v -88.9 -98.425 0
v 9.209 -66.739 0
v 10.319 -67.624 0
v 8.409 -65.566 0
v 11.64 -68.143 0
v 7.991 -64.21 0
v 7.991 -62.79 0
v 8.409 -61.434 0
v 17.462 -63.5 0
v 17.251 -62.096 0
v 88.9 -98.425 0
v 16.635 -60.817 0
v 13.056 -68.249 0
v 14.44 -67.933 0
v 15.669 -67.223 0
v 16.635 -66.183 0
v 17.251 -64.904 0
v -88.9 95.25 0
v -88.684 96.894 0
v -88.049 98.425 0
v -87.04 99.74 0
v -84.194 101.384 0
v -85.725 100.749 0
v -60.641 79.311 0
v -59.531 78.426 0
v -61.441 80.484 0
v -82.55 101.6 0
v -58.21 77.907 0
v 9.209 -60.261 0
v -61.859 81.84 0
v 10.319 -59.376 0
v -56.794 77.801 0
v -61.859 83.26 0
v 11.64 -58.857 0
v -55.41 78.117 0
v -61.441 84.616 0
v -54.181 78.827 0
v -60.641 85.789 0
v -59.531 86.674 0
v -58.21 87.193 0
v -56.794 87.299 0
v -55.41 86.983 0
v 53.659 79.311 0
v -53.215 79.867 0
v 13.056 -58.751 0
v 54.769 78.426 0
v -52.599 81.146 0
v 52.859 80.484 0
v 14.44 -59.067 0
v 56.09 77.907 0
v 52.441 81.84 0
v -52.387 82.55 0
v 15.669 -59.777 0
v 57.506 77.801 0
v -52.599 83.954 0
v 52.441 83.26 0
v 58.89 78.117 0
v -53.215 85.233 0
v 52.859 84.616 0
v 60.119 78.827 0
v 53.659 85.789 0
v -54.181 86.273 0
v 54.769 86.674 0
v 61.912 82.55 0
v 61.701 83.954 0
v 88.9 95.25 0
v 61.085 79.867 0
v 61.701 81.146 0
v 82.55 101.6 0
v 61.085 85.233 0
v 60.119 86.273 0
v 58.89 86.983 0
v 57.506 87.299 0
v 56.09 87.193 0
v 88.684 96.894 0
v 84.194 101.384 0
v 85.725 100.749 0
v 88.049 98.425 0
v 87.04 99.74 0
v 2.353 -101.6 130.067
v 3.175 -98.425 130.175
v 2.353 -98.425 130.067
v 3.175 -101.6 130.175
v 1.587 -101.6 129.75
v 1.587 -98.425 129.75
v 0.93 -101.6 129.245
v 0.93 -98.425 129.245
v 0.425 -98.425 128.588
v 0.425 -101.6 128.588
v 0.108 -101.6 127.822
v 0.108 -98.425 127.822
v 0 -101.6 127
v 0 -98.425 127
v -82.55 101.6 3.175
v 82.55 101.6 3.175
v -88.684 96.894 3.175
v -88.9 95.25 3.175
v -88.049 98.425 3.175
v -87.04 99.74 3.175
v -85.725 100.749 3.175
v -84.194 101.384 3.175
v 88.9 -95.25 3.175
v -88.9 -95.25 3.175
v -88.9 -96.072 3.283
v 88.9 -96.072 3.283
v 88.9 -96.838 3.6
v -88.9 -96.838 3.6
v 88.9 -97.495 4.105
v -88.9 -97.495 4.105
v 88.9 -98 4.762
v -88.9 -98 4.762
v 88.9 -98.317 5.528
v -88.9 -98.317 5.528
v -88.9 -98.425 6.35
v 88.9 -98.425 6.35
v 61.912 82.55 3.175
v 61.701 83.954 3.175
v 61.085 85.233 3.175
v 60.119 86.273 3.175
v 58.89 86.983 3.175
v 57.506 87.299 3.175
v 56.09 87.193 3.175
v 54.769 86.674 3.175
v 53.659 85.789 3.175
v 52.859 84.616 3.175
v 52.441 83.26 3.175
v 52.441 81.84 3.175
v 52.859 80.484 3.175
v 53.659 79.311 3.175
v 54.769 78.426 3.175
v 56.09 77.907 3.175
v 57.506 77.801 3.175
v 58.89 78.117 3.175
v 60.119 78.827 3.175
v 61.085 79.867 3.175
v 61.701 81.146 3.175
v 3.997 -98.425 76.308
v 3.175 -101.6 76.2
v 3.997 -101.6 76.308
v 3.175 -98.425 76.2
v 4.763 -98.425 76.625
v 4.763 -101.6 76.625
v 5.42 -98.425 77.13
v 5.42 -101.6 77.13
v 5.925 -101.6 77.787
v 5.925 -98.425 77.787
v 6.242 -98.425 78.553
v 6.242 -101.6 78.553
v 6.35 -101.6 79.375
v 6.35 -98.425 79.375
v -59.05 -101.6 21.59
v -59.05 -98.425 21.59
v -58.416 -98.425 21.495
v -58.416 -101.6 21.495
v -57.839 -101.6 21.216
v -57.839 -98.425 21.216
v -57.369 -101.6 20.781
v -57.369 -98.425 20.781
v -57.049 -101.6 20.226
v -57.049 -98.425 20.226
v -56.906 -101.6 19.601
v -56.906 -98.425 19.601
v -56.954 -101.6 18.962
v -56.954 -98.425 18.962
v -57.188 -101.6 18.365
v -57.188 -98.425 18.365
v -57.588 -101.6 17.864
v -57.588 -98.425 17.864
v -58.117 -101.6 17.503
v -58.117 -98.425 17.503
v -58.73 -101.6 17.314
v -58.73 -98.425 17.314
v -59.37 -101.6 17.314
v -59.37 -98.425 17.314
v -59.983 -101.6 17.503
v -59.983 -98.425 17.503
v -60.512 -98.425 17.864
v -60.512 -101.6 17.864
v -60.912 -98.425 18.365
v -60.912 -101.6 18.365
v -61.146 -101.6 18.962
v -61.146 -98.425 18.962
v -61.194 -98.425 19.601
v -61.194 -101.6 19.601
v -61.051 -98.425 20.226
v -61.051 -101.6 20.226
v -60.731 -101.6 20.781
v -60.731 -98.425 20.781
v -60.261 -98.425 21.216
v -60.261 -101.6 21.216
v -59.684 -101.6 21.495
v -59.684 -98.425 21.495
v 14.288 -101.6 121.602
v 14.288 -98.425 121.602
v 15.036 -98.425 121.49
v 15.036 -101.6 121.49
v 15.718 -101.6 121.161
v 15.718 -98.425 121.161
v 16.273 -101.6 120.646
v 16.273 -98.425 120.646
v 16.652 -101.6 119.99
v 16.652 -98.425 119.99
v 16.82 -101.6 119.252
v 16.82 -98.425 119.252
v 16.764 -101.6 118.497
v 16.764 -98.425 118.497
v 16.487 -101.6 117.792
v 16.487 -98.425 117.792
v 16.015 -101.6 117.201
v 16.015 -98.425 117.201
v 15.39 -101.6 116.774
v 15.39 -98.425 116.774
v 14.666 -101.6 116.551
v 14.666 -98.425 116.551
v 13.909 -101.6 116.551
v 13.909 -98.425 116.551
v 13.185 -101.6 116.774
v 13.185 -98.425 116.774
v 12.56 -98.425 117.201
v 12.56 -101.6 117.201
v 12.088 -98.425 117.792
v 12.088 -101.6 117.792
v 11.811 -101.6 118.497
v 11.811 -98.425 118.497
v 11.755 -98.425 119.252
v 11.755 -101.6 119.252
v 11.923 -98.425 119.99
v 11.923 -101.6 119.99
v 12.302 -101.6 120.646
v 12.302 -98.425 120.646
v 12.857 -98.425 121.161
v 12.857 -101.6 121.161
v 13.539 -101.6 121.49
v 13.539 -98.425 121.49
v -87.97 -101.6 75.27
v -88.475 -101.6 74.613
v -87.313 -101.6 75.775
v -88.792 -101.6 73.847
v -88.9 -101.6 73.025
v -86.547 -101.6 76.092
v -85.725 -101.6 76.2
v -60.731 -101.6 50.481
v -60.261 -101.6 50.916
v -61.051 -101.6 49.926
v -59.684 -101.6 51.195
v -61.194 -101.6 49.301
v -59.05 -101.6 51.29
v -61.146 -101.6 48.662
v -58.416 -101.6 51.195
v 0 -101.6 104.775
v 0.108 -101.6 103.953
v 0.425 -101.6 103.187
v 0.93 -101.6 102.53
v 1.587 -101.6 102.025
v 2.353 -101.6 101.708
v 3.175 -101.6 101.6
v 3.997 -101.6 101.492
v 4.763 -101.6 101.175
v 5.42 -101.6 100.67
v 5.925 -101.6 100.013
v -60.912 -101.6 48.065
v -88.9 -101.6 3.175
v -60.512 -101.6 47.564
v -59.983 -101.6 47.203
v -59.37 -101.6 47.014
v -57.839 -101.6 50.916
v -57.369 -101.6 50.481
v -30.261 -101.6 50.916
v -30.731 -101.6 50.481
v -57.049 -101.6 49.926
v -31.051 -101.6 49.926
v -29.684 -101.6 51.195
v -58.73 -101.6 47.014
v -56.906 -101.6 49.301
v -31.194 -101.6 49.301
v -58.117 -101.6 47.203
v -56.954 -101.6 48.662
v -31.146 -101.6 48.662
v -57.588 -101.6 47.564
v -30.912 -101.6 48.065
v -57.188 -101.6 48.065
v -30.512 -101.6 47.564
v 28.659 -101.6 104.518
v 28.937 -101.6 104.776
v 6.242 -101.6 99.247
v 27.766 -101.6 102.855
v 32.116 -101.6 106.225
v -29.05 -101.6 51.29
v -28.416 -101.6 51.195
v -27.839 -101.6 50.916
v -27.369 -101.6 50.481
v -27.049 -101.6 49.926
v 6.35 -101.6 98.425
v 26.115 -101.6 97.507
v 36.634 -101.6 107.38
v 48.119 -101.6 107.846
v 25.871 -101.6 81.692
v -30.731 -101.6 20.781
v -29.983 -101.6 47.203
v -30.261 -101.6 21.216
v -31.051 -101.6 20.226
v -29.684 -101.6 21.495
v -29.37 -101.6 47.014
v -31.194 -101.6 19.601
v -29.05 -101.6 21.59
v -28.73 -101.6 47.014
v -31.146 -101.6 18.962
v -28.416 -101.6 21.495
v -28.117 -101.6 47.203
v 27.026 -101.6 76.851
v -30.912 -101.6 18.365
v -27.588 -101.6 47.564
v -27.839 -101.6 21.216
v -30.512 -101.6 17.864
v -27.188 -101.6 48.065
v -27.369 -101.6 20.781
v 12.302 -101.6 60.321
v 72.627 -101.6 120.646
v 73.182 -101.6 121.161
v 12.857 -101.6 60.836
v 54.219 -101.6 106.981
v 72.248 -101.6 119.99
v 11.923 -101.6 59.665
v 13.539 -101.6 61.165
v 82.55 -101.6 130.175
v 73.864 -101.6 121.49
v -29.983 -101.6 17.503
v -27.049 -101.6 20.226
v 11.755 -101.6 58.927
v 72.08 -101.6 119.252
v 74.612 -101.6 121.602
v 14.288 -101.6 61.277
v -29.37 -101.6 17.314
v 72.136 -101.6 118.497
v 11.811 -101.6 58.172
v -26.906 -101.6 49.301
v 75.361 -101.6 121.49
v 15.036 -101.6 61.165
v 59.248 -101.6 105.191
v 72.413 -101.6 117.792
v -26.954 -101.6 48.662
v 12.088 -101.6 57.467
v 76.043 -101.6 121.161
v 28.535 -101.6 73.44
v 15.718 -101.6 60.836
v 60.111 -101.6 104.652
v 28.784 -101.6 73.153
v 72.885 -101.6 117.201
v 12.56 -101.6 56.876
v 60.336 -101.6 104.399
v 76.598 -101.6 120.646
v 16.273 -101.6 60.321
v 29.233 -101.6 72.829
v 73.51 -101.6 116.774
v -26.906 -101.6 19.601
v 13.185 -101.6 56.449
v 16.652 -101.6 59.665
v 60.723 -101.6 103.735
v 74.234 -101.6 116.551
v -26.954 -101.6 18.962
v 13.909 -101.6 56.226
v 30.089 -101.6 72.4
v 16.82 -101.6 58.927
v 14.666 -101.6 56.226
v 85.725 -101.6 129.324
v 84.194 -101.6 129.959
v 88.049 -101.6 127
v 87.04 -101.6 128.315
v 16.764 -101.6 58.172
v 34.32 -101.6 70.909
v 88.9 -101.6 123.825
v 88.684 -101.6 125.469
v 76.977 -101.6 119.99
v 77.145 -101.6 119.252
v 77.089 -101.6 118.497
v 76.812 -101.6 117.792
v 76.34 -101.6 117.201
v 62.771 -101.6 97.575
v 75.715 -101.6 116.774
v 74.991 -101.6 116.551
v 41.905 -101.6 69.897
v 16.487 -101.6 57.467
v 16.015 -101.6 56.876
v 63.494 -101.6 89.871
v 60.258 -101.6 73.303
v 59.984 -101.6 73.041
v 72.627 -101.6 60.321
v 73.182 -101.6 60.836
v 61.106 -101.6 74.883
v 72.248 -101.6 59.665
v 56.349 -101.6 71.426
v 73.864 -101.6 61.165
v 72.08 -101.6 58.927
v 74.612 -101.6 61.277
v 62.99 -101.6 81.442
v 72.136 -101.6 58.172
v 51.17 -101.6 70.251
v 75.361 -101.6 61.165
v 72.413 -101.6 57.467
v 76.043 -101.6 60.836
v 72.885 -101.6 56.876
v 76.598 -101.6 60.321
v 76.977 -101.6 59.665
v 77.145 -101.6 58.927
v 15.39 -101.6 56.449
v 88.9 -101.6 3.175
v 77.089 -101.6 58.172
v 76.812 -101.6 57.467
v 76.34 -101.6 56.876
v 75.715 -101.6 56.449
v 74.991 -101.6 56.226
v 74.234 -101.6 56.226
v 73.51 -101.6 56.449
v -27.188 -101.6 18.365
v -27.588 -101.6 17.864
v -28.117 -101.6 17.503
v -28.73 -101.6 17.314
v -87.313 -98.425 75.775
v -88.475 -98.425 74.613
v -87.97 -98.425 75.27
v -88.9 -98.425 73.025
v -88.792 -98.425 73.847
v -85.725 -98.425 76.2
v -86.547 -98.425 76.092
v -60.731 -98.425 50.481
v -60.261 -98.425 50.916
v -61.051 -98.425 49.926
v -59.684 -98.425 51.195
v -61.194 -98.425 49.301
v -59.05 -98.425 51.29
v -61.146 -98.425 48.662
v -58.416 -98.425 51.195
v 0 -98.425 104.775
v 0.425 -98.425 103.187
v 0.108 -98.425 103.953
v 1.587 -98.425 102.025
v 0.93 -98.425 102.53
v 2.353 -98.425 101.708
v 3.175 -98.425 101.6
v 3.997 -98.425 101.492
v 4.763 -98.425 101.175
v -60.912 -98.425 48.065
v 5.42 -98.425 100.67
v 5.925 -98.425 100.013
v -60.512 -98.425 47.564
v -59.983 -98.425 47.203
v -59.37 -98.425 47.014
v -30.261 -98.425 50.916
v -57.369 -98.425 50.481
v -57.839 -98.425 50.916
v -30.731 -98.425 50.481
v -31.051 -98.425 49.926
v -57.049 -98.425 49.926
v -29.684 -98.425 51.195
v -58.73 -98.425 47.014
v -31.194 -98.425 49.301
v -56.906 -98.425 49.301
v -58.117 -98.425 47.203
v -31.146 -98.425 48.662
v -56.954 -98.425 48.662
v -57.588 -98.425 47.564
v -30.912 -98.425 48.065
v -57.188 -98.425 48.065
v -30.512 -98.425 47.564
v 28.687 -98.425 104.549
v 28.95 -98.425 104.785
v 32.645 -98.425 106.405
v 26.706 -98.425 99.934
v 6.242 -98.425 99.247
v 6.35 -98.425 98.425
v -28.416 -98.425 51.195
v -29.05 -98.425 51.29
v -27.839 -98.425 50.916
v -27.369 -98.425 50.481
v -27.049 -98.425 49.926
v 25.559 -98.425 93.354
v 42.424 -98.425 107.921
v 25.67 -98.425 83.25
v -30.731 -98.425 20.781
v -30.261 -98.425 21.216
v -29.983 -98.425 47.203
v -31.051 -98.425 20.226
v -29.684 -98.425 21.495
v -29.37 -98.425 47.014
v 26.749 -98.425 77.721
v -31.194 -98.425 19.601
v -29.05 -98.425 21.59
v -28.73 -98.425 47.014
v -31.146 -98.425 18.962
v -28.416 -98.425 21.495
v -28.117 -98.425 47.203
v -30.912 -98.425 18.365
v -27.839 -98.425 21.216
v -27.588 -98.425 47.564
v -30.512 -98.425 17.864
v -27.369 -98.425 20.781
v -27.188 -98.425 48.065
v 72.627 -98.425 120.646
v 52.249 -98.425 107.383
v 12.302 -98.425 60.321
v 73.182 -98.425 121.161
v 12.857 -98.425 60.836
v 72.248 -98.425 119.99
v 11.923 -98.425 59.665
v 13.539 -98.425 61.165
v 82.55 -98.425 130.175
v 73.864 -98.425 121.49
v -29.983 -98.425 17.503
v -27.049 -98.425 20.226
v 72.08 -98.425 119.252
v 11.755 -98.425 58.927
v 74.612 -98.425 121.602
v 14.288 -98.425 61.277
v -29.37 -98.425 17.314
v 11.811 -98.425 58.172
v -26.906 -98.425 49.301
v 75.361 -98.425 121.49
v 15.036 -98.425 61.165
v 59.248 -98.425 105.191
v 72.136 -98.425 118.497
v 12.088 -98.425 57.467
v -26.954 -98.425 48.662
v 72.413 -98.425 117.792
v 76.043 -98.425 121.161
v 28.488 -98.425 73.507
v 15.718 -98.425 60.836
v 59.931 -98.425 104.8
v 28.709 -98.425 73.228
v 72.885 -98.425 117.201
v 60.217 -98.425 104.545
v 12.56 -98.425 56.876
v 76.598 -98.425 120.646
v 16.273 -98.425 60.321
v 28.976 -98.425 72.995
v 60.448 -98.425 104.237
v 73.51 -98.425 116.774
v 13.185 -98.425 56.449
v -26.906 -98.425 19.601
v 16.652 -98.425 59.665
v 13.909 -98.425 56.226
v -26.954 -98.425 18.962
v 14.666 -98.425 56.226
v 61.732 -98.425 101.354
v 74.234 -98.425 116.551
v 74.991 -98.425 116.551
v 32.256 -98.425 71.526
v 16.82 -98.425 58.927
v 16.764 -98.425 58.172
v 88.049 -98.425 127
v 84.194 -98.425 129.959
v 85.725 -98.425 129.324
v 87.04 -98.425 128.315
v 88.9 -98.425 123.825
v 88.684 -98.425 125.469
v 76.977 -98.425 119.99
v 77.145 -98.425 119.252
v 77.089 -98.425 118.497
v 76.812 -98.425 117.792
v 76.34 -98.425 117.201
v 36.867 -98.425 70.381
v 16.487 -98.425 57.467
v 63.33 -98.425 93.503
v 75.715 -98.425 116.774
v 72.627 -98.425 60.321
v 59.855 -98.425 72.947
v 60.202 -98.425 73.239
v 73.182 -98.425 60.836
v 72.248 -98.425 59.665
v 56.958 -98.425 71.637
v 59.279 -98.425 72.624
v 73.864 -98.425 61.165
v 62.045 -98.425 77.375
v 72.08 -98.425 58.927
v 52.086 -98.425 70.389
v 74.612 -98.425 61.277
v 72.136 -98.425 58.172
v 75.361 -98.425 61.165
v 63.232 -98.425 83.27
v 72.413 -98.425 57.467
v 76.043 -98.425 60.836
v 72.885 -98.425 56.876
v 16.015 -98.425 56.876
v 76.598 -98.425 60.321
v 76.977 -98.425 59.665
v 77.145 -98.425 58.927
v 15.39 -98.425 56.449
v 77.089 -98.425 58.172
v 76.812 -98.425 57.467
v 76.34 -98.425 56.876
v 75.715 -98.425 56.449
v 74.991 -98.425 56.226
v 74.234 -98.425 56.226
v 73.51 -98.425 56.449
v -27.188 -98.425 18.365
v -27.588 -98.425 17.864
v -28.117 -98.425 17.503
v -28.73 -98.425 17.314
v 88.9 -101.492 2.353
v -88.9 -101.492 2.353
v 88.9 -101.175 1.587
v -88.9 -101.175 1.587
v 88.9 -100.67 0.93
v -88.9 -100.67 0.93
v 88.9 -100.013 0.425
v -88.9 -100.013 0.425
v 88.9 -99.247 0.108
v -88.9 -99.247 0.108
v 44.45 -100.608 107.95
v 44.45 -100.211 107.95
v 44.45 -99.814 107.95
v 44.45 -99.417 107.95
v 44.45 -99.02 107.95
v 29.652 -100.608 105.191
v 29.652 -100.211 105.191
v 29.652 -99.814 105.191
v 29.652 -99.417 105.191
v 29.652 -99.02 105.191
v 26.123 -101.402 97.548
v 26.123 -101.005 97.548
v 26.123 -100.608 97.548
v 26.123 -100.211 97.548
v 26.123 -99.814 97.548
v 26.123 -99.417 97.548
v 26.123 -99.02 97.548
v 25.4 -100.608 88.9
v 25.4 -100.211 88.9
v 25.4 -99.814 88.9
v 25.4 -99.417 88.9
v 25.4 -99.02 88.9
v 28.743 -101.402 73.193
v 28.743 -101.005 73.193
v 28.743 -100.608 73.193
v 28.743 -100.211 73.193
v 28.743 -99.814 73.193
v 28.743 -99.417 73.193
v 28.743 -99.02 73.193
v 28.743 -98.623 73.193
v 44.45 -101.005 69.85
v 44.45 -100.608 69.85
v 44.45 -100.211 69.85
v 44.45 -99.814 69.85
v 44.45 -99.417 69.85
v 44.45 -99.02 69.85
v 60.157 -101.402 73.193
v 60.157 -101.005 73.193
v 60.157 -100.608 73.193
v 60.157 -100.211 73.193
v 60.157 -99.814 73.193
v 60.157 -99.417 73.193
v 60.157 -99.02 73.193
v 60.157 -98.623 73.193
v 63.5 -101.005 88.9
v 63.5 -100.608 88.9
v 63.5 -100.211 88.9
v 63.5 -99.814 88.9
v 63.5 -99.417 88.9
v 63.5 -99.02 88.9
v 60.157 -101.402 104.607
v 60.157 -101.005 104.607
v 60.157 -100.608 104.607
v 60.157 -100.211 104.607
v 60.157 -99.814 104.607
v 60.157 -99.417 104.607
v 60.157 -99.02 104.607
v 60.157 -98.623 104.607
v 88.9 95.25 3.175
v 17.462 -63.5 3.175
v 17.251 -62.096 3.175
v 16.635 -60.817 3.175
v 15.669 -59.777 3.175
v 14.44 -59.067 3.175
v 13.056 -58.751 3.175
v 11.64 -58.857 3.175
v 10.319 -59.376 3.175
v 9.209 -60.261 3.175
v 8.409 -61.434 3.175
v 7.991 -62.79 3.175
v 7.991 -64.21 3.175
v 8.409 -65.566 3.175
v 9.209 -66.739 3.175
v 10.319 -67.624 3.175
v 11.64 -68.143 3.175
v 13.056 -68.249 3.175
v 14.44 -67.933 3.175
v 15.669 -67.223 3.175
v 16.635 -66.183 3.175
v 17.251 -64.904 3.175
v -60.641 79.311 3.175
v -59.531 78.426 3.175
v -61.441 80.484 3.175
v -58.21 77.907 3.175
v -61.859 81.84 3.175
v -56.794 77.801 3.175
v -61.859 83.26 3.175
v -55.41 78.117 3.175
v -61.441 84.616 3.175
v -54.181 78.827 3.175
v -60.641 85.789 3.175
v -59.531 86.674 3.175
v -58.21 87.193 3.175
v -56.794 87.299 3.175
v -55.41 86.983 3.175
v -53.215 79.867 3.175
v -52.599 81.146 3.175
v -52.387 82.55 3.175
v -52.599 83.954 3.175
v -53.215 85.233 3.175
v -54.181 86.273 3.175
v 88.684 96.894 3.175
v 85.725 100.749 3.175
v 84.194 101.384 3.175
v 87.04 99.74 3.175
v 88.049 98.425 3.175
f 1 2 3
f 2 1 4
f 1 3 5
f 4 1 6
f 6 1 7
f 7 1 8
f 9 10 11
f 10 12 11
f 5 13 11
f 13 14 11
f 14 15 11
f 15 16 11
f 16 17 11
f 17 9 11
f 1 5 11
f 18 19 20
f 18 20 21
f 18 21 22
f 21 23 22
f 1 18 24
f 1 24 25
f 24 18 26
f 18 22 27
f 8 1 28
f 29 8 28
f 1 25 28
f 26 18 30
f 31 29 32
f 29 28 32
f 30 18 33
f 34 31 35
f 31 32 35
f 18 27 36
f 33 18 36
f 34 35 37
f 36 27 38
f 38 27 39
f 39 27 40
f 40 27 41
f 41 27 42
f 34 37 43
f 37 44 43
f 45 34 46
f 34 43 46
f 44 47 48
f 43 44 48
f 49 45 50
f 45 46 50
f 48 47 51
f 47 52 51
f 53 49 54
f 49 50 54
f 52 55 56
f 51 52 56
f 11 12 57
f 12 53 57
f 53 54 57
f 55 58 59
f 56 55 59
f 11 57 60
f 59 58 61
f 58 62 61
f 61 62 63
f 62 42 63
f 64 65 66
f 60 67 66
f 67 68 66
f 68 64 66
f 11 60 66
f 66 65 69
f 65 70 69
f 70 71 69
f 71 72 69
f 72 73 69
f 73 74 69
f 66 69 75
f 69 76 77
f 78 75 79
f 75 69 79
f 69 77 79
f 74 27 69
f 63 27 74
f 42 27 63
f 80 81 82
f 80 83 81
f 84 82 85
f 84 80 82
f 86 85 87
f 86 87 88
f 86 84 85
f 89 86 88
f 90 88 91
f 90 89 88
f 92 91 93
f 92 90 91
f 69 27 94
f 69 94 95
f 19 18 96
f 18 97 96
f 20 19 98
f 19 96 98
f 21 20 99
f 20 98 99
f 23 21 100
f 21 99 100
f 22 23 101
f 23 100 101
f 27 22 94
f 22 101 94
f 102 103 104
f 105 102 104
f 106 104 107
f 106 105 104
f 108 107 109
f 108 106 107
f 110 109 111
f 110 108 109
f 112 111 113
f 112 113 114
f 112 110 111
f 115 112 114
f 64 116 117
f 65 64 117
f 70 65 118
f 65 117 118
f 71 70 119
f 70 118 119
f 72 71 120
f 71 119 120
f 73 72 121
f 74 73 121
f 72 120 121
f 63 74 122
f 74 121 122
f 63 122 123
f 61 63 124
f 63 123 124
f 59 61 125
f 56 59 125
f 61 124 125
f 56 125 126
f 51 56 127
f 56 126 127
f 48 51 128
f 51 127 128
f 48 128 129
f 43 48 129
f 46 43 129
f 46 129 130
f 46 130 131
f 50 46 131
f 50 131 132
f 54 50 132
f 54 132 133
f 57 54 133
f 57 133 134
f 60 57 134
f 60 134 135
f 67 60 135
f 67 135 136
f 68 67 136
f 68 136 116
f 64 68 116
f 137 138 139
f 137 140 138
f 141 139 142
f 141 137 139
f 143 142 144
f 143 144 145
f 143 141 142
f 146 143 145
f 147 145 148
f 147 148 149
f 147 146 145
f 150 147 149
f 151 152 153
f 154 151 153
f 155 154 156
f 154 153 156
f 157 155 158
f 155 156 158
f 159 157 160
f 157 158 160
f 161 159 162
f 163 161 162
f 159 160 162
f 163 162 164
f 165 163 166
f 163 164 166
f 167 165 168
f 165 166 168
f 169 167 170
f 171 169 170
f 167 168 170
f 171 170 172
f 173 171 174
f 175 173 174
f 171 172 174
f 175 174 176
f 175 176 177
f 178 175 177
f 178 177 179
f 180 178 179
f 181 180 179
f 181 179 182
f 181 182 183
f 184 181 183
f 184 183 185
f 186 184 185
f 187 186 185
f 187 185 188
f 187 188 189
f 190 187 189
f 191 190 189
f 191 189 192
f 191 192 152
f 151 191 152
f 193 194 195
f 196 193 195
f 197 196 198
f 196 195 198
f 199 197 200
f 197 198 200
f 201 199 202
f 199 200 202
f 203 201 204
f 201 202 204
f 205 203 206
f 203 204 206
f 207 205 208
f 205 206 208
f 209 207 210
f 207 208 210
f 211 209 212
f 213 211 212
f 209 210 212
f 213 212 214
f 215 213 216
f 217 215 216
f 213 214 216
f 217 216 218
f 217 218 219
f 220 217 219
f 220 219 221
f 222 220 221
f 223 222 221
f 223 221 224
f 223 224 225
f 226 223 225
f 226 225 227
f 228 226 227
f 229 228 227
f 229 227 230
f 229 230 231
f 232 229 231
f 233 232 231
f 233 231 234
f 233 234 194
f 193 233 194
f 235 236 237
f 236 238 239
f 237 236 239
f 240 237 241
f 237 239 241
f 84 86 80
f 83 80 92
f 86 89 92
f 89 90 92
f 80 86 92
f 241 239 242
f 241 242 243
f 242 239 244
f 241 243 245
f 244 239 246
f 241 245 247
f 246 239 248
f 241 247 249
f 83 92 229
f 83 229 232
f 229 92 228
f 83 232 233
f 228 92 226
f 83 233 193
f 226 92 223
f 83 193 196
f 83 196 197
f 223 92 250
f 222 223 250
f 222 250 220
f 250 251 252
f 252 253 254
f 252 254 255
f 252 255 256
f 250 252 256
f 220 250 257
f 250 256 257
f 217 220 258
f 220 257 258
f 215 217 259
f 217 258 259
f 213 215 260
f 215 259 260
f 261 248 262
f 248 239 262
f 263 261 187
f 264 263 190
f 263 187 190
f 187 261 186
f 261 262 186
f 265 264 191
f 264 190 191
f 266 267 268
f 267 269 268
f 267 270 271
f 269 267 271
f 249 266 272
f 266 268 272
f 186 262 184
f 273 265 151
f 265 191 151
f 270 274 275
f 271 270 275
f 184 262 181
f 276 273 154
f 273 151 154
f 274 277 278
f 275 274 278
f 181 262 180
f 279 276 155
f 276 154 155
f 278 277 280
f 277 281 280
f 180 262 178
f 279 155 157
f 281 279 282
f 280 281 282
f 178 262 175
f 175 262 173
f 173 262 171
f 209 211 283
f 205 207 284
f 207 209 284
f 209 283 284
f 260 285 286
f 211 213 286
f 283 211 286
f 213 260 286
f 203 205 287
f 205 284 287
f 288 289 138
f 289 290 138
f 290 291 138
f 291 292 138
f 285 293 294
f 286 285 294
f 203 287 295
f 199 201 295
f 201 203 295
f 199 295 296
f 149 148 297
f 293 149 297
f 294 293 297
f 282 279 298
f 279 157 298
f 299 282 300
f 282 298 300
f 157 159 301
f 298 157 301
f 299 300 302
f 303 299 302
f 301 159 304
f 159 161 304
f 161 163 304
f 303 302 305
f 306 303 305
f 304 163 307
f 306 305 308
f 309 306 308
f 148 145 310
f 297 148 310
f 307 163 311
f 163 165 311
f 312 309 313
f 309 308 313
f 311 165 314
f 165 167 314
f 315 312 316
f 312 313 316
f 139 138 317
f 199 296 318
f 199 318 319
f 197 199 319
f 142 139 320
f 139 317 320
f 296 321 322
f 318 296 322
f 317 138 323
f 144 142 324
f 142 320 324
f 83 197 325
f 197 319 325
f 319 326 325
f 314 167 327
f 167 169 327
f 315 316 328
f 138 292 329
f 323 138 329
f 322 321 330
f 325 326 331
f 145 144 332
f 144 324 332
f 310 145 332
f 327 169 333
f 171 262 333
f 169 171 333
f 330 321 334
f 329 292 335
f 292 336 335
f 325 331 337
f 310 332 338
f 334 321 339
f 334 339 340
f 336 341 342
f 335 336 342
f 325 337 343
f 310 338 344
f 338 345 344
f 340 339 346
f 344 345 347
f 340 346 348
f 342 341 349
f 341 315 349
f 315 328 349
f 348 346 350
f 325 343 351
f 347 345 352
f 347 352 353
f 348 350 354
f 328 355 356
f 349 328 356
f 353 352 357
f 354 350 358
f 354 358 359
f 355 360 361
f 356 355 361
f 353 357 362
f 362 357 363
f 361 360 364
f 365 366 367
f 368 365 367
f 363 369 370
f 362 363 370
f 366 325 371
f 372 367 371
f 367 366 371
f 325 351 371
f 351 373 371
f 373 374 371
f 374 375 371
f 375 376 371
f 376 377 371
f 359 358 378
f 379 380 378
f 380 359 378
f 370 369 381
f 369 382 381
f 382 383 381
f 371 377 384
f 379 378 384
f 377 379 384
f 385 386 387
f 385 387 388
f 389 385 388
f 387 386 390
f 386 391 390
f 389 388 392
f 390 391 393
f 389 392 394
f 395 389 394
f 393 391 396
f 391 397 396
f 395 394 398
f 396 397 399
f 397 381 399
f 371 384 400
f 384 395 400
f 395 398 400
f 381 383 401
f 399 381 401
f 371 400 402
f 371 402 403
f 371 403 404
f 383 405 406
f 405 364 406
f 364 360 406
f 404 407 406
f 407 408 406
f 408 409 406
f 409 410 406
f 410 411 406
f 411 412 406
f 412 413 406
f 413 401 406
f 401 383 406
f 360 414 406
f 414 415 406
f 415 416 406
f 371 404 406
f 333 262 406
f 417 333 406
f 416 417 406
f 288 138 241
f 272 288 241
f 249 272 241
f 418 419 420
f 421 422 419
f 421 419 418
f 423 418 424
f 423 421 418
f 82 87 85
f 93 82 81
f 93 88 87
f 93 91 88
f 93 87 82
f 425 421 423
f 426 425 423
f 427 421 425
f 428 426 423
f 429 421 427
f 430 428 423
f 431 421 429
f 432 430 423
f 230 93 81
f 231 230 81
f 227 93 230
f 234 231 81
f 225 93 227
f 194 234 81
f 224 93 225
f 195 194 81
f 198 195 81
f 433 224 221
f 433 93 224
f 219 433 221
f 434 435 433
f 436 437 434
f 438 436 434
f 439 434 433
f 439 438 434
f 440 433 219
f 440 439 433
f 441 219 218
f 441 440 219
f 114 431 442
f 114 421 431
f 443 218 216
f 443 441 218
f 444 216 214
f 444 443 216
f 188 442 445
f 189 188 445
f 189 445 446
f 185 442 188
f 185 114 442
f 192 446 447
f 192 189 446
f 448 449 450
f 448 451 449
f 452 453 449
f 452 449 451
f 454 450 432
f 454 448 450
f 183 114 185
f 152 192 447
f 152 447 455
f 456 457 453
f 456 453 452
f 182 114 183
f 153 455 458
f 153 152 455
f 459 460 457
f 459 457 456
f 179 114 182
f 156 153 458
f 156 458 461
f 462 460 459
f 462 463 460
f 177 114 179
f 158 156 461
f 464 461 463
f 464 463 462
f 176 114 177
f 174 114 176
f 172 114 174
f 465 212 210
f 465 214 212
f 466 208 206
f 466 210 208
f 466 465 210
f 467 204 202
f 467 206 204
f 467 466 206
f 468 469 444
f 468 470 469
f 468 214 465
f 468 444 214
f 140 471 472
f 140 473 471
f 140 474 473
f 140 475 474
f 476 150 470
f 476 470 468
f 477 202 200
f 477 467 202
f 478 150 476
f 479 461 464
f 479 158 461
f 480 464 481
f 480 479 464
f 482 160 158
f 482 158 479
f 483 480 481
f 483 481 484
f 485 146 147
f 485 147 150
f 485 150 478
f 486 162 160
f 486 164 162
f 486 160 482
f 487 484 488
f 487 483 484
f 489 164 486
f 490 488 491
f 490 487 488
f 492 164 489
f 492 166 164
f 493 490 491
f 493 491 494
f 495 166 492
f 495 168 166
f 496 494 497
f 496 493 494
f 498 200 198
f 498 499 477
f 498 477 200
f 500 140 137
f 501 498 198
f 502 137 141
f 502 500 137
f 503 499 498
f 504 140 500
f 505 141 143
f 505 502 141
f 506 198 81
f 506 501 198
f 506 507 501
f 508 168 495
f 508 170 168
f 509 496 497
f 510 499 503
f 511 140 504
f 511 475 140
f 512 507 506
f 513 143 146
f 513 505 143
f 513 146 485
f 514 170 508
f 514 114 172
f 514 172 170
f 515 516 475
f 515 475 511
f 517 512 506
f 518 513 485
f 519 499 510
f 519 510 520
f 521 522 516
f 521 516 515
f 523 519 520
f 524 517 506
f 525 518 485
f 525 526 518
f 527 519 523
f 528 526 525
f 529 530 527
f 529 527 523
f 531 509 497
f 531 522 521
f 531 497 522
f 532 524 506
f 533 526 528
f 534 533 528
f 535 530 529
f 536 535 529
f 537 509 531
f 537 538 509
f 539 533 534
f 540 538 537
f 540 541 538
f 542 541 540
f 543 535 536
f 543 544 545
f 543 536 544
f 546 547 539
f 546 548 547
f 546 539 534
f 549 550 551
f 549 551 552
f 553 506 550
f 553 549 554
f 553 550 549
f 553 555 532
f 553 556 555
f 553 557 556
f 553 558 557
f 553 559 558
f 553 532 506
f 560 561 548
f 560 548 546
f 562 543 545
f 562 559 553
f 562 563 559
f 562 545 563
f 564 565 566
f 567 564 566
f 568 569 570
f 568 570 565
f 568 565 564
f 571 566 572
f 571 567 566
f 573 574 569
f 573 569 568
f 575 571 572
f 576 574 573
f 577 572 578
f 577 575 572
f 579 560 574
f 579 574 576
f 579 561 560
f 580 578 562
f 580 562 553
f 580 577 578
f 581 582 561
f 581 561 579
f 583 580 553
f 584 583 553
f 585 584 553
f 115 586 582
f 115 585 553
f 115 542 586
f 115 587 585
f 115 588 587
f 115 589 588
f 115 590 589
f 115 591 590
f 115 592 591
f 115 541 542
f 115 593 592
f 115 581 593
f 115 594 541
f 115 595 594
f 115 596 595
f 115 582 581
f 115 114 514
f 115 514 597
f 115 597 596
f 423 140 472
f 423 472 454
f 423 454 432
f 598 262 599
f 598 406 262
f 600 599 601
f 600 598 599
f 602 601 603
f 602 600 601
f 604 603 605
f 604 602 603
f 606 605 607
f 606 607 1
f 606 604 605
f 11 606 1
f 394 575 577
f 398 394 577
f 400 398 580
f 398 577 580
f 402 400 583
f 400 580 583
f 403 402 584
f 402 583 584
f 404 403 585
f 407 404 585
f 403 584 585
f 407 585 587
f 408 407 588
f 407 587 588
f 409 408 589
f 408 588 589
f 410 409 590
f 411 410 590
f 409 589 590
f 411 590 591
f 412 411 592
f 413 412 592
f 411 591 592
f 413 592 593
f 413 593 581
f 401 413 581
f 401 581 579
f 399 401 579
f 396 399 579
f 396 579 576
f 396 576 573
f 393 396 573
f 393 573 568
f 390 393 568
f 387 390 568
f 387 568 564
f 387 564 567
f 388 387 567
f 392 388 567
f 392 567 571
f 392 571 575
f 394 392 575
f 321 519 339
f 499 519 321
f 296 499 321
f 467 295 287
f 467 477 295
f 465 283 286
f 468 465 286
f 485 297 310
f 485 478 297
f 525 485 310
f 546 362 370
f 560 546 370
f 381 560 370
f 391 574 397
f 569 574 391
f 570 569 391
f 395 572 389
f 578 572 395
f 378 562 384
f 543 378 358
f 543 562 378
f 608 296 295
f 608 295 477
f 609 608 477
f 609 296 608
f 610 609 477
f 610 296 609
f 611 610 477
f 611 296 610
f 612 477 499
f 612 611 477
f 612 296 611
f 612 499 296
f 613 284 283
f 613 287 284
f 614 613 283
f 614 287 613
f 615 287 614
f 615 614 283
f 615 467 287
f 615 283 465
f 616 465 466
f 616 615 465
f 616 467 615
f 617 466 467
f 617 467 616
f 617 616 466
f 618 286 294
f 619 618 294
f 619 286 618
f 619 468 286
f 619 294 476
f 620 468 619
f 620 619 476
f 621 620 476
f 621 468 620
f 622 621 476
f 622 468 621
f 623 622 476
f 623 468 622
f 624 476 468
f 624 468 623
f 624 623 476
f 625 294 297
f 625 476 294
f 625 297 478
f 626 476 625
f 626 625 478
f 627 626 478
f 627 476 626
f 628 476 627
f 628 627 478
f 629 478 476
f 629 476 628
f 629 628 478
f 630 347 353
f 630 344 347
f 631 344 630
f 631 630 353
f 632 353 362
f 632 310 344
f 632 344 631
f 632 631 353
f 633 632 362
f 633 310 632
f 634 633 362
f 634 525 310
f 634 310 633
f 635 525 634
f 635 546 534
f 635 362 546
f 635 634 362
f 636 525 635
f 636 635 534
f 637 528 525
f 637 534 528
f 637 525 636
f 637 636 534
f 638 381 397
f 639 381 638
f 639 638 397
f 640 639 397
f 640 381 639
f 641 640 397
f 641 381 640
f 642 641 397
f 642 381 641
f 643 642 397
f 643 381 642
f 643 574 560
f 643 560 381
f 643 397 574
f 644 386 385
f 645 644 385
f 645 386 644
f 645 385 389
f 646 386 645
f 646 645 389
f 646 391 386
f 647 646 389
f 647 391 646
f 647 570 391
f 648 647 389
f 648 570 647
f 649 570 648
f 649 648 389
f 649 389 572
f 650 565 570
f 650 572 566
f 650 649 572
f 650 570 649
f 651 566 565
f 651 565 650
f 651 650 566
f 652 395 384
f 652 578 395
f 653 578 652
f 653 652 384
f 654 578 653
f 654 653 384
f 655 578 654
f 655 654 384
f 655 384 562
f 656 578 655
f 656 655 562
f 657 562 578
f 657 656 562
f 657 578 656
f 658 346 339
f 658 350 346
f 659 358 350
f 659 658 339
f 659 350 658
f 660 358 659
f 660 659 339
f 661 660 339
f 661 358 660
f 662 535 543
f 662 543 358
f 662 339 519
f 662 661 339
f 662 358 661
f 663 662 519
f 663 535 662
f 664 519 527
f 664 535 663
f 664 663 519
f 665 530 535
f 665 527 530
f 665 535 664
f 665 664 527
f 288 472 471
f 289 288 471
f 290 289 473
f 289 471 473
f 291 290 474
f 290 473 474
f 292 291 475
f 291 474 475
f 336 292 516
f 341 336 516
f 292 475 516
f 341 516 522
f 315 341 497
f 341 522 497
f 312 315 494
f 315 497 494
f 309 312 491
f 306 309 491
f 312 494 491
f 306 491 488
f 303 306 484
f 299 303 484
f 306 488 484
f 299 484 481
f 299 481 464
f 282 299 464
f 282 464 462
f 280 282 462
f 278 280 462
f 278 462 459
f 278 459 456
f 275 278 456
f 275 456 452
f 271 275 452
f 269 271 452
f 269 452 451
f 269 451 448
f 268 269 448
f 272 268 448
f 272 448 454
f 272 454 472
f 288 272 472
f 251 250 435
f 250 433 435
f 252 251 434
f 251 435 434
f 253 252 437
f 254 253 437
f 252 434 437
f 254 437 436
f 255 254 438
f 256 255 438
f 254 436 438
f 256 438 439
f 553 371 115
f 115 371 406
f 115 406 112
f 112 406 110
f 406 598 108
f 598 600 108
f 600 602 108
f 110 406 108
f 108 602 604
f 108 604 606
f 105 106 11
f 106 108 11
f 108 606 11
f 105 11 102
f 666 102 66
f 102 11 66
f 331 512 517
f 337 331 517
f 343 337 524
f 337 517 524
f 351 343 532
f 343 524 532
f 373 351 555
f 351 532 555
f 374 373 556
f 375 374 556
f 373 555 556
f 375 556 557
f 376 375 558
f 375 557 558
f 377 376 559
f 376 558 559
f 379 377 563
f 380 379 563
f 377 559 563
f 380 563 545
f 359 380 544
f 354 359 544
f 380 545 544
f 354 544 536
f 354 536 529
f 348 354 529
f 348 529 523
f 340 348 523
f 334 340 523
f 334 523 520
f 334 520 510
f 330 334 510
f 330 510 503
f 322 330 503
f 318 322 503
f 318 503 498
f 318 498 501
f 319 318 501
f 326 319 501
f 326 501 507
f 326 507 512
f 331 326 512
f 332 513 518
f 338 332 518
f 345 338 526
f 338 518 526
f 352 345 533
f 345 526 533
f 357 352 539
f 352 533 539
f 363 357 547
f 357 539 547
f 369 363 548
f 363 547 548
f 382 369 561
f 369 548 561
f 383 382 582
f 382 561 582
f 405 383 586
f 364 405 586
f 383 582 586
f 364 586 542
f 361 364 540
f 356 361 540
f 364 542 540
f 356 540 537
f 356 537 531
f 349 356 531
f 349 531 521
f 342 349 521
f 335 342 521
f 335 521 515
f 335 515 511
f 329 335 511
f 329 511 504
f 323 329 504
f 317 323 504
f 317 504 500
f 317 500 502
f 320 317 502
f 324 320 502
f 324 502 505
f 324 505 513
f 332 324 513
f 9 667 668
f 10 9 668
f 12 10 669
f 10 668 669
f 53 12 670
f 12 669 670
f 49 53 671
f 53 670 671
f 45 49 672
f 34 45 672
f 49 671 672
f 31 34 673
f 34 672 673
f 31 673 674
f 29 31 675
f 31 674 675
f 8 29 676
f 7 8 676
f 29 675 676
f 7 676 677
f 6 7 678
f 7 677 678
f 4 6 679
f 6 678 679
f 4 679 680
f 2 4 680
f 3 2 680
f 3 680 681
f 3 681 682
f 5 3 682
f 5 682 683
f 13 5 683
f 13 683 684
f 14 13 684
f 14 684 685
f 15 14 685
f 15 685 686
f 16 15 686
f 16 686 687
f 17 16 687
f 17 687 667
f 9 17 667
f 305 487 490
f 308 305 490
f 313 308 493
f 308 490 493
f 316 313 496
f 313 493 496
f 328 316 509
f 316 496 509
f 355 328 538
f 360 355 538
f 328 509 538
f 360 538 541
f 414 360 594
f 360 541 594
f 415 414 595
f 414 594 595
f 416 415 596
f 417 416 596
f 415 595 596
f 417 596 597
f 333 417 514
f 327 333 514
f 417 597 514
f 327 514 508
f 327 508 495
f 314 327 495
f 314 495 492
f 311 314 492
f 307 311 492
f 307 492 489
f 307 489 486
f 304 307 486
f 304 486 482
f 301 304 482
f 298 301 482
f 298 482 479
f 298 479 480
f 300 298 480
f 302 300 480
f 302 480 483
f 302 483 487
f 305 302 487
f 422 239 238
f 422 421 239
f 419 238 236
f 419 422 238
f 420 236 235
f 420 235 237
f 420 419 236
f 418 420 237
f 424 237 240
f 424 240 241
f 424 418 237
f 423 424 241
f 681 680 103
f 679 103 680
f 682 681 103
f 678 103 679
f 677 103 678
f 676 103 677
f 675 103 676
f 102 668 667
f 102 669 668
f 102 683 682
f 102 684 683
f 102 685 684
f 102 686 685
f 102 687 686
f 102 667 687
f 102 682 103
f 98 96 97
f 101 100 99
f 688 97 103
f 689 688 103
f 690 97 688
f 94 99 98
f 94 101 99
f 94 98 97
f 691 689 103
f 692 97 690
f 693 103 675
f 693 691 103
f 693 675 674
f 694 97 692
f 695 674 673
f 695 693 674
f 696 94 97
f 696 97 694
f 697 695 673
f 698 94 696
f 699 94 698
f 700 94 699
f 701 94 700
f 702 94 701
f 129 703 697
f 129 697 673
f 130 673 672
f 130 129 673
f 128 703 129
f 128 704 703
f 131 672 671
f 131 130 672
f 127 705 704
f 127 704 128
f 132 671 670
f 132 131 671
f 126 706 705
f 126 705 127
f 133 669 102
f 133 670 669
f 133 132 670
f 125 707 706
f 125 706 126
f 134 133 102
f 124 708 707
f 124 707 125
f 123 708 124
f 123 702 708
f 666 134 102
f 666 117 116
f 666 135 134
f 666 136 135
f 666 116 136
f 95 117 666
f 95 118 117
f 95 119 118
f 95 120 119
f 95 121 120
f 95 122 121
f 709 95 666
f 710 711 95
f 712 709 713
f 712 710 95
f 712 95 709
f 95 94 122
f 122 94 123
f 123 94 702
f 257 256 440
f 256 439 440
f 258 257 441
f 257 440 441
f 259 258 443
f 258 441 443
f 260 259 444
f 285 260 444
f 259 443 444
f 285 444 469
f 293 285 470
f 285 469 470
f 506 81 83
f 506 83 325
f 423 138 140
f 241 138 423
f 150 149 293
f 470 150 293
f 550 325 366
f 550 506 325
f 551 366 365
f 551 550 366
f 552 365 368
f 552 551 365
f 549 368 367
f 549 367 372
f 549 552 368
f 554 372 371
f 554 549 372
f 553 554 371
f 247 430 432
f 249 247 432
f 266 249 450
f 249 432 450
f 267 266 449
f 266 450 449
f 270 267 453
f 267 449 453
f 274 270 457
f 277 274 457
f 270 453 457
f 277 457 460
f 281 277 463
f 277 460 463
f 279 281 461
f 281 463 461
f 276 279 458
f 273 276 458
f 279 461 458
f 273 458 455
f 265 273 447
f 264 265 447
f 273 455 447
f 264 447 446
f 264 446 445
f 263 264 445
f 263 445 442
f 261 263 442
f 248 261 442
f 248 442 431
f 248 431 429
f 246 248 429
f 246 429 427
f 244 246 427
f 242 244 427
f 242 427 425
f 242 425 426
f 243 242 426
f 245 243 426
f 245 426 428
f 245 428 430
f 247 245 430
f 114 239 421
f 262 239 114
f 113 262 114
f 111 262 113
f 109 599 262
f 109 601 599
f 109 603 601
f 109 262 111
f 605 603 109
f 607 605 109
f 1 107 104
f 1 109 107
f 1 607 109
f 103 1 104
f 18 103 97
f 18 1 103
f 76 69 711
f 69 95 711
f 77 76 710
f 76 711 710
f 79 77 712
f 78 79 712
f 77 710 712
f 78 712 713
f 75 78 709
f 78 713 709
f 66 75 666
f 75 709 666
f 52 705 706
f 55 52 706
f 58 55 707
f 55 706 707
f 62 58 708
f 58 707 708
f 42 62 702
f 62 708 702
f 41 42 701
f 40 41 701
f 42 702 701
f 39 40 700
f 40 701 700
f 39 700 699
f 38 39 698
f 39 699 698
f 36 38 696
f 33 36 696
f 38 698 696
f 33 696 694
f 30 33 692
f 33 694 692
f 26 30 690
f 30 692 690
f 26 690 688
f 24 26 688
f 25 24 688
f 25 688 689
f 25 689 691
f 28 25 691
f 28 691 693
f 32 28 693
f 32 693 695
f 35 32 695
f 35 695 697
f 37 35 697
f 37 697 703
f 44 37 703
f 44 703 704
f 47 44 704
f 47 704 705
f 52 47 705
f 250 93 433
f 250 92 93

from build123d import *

# Parameters (mm, degrees)
SKETCH2_W               = 177.8
SKETCH2_H               = 203.2
BOSS_EXTRUDE1_DEPTH     = 3.175
SKETCH3_W               = 177.8
SKETCH3_H               = 3.175
BOSS_EXTRUDE2_DEPTH     = 127
FILLET1_R               = 3.175
FILLET2_R               = 6.35
CUT_EXTRUDE1_DEPTH      = 255.673793803
CUT_EXTRUDE1_DEPTH_BACK = 255.673793803
FILLET4_R               = 3.175
SKETCH6_R               = 2.54
SKETCH6_R_2             = 2.15
CUT_EXTRUDE2_DEPTH      = 255.673793803
SKETCH7_R               = 4.7625
CUT_EXTRUDE3_DEPTH      = 186.350397895
CUT_EXTRUDE4_DEPTH      = 255.673793803


with BuildPart() as part:
    # Sketch2 → Boss-Extrude1 (new body)
    with BuildSketch(Plane.XY):
        Rectangle(SKETCH2_W, SKETCH2_H)
    extrude(amount=BOSS_EXTRUDE1_DEPTH)

    # Sketch3 → Boss-Extrude2 (add)
    with BuildSketch(Plane.XY.offset(3.175)):
        with Locations((0, -100.0125)):
            Rectangle(SKETCH3_W, SKETCH3_H)
    extrude(amount=BOSS_EXTRUDE2_DEPTH)

    # Fillet1
    fillet1_edges = [part.edges().sort_by_distance(p)[0] for p in [
        (0, -98.425, 3.175),
        (0, -101.6, 0),
    ]]
    fillet(fillet1_edges, radius=FILLET1_R)

    # Fillet2
    fillet2_edges = [part.edges().sort_by_distance(p)[0] for p in [
        (-88.9, -100.0125, 130.175),
        (88.9, -100.0125, 130.175),
        (-88.9, 101.6, 1.5875),
        (88.9, 101.6, 1.5875),
    ]]
    fillet(fillet2_edges, radius=FILLET2_R)

    # Sketch5 → Cut-Extrude1 (cut, two sides: drawn at the far end of the back side and taken through both)
    with BuildSketch(Plane(origin=(0, -98.425, 0), x_dir=(1, 0, 0), z_dir=(0, 1, 0)).offset(-CUT_EXTRUDE1_DEPTH_BACK)):
        Polygon((-485.781273778, -76.2), (-88.9, -76.2), (6.35, -76.2), (6.35, -101.6), (0, -101.6), (0, -130.175), (0, -527.056273778), (-539.971017798, -1108.855450333), (-1025.752291576, -657.999176556), align=None)
    extrude(amount=CUT_EXTRUDE1_DEPTH + CUT_EXTRUDE1_DEPTH_BACK, mode=Mode.SUBTRACT)

    # Fillet4
    fillet4_edges = [part.edges().sort_by_distance(p)[0] for p in [
        (6.35, -100.0125, 101.6),
        (-88.9, -100.0125, 76.2),
        (0, -100.0125, 130.175),
        (0, -100.0125, 101.6),
        (6.35, -100.0125, 76.2),
    ]]
    fillet(fillet4_edges, radius=FILLET4_R - 0.0001)  # a hair under: the kernel refuses the full size

    # Sketch6 → Cut-Extrude2 (cut, through all)
    with BuildSketch(Plane(origin=(0, -98.425, 0), x_dir=(1, 0, 0), z_dir=(0, 1, 0))):
        with Locations(Location((74.6125, -119.0625, 0), (0, 0, 270))):
            Circle(SKETCH6_R)
        with Locations(Location((14.2875, -119.0625, 0), (0, 0, 270))):
            Circle(SKETCH6_R)
        with Locations(Location((14.2875, -58.7375, 0), (0, 0, 270))):
            Circle(SKETCH6_R)
        with Locations(Location((74.6125, -58.7375, 0), (0, 0, 270))):
            Circle(SKETCH6_R)
        with Locations(Location((-29.05, -49.140037229, 0), (0, 0, 270))):
            Circle(SKETCH6_R_2)
        with Locations(Location((-59.05, -49.140037229, 0), (0, 0, 270))):
            Circle(SKETCH6_R_2)
        with Locations(Location((-29.05, -19.440037229, 0), (0, 0, 270))):
            Circle(SKETCH6_R_2)
        with Locations(Location((-59.05, -19.440037229, 0), (0, 0, 270))):
            Circle(SKETCH6_R_2)
    extrude(amount=-CUT_EXTRUDE2_DEPTH, mode=Mode.SUBTRACT)

    # Sketch7 → Cut-Extrude3 (cut, through all)
    with BuildSketch(Plane.XY.offset(3.175)):
        with Locations((-57.15, 82.55)):
            Circle(SKETCH7_R)
        with Locations((57.15, 82.55)):
            Circle(SKETCH7_R)
        with Locations((12.7, -63.5)):
            Circle(SKETCH7_R)
    extrude(amount=-CUT_EXTRUDE3_DEPTH, mode=Mode.SUBTRACT)

    # Sketch8 → Cut-Extrude4 (cut, through all)
    with BuildSketch(Plane(origin=(0, -98.425, 0), x_dir=(1, 0, 0), z_dir=(0, 1, 0))):
        with BuildLine():
            add(Edge.make_bspline(
                [(59.248488812, -105.191004458), (54.640123193, -107.455311414), (44.45, -108.444688585), (33.894314939, -107.419818363), (28.664595213, -104.685404787), (25.930181637, -99.455685061), (24.905311414, -88.9), (25.930181637, -78.344314939), (28.664595213, -73.114595213), (33.894314939, -70.380181637), (44.45, -69.355311414), (55.005685061, -70.380181637), (60.235404787, -73.114595213), (62.969818363, -78.344314939), (63.994688585, -88.9), (62.969818363, -99.455685061), (60.235404787, -104.685404787), (59.579131084, -105.028544346), (59.248488812, -105.191004458)],
                knots=[0, 0, 0, 0, 0.116631865, 0.23326373, 0.241631865, 0.25, 0.366631865, 0.48326373, 0.491631865, 0.5, 0.616631865, 0.73326373, 0.741631865, 0.75, 0.866631865, 0.98326373, 0.991631865, 1, 1, 1, 1], degree=3))
        make_face()
    extrude(amount=-CUT_EXTRUDE4_DEPTH, mode=Mode.SUBTRACT)


solid = part.part
